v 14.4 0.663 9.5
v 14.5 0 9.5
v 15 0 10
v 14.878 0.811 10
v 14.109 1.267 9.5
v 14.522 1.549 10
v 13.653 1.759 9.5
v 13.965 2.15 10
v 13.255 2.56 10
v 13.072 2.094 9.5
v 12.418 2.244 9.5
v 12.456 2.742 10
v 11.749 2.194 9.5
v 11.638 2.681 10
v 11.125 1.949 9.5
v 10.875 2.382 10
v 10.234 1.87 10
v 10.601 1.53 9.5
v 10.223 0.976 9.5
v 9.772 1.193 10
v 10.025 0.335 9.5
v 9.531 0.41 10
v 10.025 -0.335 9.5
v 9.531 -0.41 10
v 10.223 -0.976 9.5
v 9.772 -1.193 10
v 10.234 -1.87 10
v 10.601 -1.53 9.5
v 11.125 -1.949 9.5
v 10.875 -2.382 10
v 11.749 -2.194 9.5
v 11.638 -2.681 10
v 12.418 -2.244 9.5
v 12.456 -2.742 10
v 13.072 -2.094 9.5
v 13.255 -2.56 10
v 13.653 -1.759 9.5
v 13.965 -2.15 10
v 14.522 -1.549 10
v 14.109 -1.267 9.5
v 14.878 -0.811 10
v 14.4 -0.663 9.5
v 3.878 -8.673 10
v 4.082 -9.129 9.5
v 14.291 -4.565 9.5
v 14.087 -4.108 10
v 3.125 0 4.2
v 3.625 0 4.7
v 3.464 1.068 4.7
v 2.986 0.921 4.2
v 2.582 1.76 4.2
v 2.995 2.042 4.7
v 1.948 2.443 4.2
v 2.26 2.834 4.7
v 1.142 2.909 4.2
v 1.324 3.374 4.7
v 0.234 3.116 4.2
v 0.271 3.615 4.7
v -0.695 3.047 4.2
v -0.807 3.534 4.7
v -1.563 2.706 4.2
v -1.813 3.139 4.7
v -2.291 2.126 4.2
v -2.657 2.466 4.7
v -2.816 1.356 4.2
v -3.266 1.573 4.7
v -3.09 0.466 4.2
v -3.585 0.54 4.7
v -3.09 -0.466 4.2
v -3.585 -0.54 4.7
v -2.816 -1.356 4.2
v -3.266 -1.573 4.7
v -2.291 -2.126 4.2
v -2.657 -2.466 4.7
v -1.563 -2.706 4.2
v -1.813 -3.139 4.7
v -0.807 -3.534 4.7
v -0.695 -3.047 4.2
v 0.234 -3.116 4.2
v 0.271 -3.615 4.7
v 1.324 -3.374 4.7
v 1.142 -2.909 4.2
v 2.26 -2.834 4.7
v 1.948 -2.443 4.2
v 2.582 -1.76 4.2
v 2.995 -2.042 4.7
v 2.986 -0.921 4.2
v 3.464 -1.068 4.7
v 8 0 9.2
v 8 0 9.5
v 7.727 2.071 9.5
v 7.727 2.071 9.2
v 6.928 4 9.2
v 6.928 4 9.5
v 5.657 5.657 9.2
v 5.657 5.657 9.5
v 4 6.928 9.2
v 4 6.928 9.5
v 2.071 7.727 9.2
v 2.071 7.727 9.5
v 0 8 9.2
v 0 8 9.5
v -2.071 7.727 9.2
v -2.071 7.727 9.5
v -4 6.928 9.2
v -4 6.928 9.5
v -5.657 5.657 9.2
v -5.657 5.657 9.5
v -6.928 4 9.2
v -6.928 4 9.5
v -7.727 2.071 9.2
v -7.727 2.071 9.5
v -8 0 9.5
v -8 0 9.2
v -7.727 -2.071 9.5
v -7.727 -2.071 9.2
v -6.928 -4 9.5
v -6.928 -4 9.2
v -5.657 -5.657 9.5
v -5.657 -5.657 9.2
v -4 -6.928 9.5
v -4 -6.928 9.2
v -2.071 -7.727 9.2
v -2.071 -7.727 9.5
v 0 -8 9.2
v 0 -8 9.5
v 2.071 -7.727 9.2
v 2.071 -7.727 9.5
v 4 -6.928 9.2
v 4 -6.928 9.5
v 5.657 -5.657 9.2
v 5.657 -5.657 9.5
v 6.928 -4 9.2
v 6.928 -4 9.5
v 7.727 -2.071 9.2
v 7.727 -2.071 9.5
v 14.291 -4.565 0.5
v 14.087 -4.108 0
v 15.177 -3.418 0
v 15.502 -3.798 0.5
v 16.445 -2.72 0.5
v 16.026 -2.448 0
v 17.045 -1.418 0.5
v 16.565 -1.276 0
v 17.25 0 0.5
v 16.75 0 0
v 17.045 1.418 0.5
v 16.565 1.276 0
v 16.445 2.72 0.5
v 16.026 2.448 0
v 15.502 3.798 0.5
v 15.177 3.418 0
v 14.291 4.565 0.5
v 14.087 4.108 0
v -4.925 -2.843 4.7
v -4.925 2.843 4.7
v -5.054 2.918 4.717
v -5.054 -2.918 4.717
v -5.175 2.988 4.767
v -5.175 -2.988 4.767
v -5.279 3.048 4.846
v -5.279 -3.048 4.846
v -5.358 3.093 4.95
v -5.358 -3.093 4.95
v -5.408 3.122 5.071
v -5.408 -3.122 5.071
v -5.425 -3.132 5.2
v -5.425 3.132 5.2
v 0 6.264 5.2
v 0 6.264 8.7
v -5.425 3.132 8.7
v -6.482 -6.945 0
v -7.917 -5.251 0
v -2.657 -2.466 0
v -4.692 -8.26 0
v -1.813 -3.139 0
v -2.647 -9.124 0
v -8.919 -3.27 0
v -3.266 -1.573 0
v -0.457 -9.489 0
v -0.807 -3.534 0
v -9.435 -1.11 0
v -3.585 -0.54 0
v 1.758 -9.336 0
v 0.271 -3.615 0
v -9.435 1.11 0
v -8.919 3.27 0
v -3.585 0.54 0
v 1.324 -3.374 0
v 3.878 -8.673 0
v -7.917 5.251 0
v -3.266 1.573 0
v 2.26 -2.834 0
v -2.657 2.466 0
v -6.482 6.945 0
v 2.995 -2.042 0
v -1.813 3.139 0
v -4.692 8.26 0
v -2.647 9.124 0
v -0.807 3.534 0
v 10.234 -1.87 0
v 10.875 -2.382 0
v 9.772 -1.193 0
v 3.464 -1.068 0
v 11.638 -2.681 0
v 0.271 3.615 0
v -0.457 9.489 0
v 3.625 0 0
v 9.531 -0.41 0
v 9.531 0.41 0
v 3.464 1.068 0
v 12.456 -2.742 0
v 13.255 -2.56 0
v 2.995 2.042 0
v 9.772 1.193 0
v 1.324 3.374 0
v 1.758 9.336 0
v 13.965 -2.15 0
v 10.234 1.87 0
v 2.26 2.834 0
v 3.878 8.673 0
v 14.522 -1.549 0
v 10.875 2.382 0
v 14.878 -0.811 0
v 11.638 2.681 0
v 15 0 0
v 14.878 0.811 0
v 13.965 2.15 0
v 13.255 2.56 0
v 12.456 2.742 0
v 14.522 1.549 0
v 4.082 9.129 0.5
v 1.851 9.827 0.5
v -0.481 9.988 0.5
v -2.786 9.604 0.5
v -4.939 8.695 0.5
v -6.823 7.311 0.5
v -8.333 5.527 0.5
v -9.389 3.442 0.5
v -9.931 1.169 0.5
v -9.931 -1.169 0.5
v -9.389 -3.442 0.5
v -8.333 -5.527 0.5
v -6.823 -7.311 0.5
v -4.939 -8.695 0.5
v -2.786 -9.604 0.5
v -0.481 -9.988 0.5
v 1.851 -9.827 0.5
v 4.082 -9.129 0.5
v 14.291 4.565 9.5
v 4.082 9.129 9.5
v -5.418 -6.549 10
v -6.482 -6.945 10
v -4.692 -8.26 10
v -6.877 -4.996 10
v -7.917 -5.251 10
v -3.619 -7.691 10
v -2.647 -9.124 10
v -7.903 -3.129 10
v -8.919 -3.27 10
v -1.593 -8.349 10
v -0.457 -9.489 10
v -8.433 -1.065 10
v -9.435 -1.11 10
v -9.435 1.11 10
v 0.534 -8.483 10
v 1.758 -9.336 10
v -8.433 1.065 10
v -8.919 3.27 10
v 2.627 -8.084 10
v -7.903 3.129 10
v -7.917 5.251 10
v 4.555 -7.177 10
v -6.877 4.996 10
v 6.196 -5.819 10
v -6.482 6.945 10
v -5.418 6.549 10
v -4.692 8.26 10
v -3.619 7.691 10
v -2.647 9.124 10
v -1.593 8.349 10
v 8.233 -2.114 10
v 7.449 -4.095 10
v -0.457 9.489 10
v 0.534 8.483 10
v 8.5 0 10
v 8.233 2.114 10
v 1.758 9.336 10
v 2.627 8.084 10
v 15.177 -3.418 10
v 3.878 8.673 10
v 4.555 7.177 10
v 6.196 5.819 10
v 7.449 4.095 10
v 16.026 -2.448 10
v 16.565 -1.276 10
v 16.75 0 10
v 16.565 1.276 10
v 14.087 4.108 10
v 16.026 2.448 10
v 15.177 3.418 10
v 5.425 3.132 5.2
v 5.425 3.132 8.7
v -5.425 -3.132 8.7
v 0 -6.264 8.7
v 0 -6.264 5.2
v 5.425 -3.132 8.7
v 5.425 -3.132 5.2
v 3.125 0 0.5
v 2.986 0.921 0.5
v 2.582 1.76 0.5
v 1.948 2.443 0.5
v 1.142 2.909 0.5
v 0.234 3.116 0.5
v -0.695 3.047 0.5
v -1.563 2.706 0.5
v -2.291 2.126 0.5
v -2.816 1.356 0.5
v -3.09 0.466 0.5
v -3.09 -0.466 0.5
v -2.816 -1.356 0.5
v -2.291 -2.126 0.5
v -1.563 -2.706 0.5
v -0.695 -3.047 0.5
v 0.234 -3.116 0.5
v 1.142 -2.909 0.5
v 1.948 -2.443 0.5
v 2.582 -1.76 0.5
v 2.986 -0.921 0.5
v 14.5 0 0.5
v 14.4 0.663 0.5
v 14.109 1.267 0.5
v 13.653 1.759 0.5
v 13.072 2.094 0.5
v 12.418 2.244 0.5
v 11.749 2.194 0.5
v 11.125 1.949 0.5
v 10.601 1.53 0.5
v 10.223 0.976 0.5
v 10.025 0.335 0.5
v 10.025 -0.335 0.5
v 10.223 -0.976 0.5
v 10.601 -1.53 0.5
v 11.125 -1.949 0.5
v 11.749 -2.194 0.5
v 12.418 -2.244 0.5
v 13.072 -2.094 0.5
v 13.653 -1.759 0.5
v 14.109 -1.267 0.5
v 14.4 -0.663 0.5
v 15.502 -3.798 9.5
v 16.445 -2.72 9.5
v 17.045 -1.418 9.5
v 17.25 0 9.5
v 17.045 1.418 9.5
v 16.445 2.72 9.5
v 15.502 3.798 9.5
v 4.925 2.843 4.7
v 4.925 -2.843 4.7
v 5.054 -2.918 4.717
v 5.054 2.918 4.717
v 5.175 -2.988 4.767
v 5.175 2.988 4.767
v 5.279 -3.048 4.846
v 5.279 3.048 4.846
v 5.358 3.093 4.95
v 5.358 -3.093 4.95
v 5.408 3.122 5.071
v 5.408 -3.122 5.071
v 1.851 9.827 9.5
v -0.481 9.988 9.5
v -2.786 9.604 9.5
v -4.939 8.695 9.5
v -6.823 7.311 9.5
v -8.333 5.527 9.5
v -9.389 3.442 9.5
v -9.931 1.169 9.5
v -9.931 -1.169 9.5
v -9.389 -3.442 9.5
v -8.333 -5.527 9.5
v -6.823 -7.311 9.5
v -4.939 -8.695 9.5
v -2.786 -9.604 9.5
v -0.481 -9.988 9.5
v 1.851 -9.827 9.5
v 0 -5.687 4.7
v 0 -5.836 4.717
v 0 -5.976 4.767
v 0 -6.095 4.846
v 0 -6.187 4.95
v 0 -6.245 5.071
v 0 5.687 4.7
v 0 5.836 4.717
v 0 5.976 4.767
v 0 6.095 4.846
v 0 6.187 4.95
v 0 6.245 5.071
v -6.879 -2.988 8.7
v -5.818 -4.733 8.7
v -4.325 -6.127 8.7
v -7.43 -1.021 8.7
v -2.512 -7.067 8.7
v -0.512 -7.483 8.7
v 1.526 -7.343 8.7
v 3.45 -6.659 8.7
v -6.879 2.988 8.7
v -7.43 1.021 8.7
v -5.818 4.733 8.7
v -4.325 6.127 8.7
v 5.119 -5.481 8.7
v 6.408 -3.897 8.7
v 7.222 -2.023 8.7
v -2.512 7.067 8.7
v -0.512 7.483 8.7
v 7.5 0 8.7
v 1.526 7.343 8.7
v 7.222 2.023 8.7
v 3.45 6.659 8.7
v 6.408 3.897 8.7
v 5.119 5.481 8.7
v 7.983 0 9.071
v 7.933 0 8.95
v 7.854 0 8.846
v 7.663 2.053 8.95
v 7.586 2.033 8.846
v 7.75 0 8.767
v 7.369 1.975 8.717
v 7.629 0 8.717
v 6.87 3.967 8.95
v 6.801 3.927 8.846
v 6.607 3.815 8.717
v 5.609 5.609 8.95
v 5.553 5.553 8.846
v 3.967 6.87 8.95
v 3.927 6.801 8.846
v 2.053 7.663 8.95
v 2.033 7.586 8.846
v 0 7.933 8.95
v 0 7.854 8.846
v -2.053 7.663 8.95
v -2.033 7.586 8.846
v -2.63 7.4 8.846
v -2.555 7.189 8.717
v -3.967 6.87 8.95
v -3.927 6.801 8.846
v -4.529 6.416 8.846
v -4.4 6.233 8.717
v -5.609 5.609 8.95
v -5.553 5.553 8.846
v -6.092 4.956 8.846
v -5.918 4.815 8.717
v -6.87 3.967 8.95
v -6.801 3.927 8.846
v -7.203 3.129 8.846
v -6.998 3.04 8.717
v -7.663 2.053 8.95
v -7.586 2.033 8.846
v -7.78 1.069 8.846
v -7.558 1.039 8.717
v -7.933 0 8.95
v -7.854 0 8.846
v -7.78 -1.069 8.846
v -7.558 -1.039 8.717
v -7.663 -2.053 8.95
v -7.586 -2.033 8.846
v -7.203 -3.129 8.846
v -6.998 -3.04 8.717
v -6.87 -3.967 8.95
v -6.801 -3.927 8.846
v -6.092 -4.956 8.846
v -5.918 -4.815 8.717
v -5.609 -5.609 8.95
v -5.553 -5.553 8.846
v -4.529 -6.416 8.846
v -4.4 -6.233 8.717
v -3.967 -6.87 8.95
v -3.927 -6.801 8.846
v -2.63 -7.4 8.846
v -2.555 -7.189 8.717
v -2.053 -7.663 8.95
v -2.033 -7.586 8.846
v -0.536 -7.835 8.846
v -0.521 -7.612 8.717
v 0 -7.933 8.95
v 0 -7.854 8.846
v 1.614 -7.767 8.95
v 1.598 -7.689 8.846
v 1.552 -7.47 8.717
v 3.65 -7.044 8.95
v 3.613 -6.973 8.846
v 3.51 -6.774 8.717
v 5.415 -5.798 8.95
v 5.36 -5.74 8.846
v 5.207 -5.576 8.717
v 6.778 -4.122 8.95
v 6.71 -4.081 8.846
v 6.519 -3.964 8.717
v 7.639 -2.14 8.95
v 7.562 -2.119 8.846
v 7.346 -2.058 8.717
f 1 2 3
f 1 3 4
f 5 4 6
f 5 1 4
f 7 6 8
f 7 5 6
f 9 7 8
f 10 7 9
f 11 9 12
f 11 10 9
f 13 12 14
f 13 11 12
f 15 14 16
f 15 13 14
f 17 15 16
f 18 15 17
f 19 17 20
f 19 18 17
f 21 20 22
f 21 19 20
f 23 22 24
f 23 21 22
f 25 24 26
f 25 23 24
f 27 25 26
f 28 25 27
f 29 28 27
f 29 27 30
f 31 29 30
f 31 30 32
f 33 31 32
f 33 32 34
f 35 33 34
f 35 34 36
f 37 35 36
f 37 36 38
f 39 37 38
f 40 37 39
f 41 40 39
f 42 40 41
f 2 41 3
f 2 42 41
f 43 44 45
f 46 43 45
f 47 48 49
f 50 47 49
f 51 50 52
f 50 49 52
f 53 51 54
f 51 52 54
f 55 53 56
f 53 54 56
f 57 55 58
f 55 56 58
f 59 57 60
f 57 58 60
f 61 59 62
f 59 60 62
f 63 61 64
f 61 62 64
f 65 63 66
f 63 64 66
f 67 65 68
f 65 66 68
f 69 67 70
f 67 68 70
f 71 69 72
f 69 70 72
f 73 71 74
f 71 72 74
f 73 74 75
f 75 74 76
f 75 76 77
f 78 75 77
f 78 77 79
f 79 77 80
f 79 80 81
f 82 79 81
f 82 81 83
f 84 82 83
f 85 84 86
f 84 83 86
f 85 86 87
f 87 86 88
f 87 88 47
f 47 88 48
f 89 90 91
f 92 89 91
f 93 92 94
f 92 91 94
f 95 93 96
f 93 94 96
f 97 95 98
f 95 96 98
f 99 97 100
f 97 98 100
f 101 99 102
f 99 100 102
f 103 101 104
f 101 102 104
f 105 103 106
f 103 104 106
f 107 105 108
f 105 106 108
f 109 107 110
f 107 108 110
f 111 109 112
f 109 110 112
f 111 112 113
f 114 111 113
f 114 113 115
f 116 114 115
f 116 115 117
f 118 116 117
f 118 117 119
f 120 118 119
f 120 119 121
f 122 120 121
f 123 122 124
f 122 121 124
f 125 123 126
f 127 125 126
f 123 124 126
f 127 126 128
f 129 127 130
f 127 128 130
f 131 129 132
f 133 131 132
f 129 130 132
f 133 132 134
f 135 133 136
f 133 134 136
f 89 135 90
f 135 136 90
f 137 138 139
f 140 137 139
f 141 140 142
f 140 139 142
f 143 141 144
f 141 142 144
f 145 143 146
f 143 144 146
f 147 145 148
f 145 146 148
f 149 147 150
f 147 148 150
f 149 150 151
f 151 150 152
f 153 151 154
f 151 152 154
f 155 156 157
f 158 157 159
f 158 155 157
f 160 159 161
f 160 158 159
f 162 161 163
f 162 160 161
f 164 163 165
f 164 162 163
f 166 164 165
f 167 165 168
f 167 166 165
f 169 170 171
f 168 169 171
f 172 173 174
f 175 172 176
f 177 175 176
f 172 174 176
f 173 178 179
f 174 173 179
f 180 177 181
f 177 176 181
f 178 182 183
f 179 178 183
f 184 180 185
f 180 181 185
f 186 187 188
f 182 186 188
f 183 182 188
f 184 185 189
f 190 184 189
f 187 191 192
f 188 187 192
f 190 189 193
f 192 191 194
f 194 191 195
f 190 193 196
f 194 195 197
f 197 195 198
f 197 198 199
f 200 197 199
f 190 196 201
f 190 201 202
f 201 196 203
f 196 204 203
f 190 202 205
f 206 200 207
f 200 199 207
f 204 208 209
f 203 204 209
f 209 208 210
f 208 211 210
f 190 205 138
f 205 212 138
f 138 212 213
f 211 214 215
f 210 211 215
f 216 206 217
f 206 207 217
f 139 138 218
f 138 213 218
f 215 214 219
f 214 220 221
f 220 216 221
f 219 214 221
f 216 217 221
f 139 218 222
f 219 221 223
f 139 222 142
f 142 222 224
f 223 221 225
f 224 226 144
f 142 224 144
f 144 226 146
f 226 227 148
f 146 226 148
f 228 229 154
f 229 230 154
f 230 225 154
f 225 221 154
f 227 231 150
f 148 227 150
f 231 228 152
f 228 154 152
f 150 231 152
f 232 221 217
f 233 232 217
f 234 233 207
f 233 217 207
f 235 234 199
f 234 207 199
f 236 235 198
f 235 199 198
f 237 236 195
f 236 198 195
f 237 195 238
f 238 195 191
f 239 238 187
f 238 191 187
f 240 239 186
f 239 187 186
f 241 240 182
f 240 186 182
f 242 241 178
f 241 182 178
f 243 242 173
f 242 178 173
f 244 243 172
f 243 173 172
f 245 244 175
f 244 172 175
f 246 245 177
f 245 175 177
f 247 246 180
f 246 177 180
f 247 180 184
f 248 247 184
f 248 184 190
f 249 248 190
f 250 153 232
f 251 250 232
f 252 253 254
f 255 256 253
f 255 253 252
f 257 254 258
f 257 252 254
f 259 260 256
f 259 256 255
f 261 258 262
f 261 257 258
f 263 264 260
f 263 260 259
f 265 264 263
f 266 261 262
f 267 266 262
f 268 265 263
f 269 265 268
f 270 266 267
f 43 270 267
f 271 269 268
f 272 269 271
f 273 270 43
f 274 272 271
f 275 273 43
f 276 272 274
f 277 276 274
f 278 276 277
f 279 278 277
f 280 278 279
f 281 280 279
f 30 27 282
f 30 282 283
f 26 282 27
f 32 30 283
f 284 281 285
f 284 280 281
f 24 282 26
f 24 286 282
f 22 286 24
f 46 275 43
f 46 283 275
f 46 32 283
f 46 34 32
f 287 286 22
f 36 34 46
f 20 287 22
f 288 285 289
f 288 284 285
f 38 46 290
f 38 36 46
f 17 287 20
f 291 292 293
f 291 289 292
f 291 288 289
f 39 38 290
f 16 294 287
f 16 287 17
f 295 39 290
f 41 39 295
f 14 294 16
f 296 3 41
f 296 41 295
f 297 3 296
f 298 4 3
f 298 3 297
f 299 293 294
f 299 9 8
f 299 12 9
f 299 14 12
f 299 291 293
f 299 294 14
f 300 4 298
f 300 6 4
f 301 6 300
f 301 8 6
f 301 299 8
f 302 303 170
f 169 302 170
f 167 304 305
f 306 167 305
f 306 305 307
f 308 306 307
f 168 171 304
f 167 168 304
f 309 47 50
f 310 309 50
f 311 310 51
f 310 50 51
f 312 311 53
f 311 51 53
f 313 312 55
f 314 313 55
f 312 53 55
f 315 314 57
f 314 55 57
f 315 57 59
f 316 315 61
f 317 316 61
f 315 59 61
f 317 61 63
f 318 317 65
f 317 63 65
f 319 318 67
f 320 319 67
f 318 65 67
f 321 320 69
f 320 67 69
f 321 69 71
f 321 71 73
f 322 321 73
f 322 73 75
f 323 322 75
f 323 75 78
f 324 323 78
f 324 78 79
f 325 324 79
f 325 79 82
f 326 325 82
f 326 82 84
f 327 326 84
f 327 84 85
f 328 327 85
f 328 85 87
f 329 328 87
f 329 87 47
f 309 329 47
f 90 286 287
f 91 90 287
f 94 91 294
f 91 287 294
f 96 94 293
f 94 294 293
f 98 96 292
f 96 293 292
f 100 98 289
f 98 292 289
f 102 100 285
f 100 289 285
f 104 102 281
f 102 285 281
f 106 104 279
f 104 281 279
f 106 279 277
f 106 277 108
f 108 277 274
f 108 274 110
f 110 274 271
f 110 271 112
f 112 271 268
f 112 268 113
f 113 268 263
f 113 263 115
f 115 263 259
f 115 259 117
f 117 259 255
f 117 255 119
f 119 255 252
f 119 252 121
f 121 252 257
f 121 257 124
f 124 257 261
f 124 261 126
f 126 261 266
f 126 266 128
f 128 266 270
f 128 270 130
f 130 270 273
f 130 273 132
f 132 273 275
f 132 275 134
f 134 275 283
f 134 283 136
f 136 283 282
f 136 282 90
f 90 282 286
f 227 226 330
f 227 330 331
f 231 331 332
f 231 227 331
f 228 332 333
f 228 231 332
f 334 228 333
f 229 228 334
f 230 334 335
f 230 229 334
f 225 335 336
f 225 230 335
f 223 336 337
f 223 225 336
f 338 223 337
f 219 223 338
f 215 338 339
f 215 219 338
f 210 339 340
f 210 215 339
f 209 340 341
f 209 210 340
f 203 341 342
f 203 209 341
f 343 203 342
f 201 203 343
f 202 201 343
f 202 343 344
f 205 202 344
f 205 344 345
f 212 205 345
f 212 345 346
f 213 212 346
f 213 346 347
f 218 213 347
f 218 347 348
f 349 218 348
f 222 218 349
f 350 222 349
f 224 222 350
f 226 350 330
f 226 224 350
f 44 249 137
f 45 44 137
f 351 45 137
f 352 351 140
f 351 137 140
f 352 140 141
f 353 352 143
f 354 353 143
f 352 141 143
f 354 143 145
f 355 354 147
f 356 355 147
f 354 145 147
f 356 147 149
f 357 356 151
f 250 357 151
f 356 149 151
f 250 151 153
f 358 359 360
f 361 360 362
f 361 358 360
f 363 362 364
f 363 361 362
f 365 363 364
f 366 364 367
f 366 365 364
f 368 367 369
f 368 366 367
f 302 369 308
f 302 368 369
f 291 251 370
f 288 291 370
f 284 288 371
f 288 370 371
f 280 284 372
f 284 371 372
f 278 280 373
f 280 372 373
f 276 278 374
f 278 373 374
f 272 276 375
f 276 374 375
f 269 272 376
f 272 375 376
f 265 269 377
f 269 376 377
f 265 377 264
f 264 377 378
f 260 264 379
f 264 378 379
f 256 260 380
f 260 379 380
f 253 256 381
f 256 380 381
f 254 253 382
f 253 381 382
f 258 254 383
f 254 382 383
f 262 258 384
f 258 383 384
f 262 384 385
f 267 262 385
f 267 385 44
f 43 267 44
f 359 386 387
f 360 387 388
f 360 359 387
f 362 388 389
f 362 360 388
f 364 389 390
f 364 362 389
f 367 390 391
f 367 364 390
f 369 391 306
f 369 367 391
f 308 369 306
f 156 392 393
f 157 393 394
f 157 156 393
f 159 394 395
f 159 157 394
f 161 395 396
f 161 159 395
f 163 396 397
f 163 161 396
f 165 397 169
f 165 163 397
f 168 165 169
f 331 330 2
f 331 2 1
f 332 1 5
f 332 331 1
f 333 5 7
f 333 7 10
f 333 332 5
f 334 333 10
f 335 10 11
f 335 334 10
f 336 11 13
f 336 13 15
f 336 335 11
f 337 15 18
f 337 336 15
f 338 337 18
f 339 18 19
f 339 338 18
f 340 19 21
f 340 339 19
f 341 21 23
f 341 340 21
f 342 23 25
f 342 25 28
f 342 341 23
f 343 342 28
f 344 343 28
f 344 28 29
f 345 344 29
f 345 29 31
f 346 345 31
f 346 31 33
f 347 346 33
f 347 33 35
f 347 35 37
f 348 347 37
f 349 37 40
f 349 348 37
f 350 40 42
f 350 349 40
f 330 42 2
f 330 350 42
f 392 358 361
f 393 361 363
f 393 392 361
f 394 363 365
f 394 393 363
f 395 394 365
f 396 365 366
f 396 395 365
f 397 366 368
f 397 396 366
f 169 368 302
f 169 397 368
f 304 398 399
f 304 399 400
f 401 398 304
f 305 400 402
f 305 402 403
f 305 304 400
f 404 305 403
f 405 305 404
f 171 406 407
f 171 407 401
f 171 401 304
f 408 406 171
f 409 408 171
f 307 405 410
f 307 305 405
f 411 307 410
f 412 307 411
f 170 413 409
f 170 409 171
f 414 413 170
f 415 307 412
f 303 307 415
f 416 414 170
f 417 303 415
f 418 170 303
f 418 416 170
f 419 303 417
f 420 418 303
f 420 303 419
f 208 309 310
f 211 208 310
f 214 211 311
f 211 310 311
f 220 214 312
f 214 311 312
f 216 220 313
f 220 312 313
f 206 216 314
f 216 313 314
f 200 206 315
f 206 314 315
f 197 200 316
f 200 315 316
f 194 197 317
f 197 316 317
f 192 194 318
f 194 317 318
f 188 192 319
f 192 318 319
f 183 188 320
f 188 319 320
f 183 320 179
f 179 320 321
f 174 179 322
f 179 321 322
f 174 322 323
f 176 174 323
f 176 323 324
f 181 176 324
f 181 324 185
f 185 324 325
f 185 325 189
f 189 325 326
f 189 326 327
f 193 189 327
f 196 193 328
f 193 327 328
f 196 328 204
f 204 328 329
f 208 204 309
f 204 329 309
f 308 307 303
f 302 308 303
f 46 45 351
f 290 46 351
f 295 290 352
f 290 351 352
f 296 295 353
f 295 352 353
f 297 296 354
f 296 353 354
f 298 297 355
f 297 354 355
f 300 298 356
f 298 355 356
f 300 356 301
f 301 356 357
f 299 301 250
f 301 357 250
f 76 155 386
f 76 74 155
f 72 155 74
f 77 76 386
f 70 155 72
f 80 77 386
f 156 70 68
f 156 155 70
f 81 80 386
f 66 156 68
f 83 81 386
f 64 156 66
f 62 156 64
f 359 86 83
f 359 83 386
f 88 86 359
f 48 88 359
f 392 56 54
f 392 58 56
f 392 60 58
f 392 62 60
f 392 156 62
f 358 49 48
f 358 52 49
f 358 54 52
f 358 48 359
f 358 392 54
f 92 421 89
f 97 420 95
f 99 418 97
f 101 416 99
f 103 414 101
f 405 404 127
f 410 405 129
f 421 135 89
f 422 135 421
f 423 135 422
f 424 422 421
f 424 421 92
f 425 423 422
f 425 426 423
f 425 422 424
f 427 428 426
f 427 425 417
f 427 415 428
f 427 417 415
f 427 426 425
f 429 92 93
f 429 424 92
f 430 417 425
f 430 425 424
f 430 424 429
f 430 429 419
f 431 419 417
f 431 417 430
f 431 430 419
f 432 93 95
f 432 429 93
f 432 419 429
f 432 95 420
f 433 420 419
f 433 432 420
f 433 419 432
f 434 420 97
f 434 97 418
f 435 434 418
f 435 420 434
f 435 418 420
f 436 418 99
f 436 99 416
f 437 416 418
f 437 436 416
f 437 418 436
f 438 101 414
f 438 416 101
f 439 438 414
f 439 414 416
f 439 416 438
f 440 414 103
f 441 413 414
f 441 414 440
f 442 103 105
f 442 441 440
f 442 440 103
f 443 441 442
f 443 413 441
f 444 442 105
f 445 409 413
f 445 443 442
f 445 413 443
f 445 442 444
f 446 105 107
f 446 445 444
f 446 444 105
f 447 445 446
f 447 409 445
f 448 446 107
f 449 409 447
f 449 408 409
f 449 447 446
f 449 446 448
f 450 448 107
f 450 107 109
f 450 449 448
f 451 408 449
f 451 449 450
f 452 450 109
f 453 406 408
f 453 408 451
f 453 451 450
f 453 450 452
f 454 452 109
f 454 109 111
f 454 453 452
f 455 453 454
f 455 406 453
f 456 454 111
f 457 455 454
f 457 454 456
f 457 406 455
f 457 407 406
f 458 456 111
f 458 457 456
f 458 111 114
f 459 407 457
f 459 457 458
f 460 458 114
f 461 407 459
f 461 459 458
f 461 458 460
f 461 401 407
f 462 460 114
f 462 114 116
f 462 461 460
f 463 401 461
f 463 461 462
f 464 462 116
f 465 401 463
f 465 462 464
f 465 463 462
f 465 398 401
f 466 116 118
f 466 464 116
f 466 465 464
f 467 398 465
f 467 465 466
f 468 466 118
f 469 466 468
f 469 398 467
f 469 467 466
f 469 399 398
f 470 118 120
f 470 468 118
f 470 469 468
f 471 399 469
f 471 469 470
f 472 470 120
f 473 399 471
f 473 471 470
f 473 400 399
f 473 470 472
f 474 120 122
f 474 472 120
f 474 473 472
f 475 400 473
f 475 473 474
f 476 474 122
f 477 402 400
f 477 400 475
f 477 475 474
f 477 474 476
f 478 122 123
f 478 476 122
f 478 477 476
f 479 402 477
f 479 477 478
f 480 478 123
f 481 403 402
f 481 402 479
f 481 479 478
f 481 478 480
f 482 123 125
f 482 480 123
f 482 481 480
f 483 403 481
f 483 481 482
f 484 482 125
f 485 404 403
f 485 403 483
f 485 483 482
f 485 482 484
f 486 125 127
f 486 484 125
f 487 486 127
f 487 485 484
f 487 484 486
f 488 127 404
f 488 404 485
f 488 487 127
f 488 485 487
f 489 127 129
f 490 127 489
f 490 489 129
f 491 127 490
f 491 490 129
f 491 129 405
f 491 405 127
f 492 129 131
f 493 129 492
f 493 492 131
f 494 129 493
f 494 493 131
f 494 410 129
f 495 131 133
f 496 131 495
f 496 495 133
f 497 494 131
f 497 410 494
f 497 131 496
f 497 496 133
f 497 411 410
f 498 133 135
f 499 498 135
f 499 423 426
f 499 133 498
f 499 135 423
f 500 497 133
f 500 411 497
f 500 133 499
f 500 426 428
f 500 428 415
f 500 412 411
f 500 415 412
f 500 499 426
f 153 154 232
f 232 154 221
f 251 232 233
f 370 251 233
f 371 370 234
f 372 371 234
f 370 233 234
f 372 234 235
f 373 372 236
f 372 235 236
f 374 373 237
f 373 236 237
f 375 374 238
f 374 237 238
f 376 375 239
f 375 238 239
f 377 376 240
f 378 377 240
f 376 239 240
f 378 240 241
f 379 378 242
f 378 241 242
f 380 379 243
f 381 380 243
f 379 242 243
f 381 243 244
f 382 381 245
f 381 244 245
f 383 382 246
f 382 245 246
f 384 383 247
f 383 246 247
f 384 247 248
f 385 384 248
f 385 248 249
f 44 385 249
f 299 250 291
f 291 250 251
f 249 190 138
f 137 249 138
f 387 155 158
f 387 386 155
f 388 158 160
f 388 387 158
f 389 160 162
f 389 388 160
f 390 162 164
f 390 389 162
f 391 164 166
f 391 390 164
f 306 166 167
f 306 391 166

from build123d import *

# Parameters (mm, degrees)
F0_R     = 2.25
F1_DEPTH = 10
F2_R     = 8
F3_DEPTH = 1.3
F5_DEPTH = 4
F6_R     = 3.125
F7_DEPTH = 4.701
F8_R     = 0.5
F9_SIZE  = 0.5


with BuildPart() as f1:
    # F0 (on Top) → F1 (new body)
    with BuildSketch(Plane.XY):
        with BuildLine():
            Line((14.290816, 4.564545), (4.081633, 9.129089))
            ThreePointArc((4.081633, 9.129089), (-10, 0), (4.081633, -9.129089))
            Line((4.081633, -9.129089), (14.290816, -4.564545))
            ThreePointArc((14.290816, -4.564545), (17.25, 0), (14.290816, 4.564545))
        make_face()
        with Locations((12.25, 0)):
            Circle(F0_R, mode=Mode.SUBTRACT)
    extrude(amount=F1_DEPTH)

    # F2 (on face) → F3 (cut)
    with BuildSketch(Plane.XY.offset(10)):
        Circle(F2_R)
    extrude(amount=-F3_DEPTH, mode=Mode.SUBTRACT)

    # F4 (on face) → F5 (cut)
    with BuildSketch(Plane.XY.offset(8.7)):
        Polygon((5.425, -3.132125), (5.425, 3.132125), (0, 6.26425), (-5.425, 3.132125), (-5.425, -3.132125), (0, -6.26425), align=None)
    extrude(amount=-F5_DEPTH, mode=Mode.SUBTRACT)

    # F6 (on face) → F7 (cut, through all)
    with BuildSketch(Plane.XY.offset(4.7)):
        Circle(F6_R)
    extrude(amount=-F7_DEPTH, mode=Mode.SUBTRACT)

    # F8
    f8_edges = [f1.edges().sort_by_distance(p)[0] for p in [
        (-8, 0, 8.7),
        (-2.7125, 4.698188, 4.7),
        (2.7125, 4.698188, 4.7),
        (-5.425, 0, 4.7),
        (-2.7125, -4.698188, 4.7),
        (2.7125, -4.698188, 4.7),
        (5.425, 0, 4.7),
    ]]
    fillet(f8_edges, radius=F8_R)

    # F9
    f9_edges = [f1.edges().sort_by_distance(p)[0] for p in [
        (-8, 0, 10),
        (10, 0, 10),
        (-10, 0, 10),
        (9.186224, -6.846817, 10),
        (-10, 0, 0),
        (9.186224, 6.846817, 0),
        (-3.125, 0, 0),
        (10, 0, 0),
        (-3.125, 0, 4.7),
    ]]
    chamfer(f9_edges, length=F9_SIZE)


solid = f1.part
